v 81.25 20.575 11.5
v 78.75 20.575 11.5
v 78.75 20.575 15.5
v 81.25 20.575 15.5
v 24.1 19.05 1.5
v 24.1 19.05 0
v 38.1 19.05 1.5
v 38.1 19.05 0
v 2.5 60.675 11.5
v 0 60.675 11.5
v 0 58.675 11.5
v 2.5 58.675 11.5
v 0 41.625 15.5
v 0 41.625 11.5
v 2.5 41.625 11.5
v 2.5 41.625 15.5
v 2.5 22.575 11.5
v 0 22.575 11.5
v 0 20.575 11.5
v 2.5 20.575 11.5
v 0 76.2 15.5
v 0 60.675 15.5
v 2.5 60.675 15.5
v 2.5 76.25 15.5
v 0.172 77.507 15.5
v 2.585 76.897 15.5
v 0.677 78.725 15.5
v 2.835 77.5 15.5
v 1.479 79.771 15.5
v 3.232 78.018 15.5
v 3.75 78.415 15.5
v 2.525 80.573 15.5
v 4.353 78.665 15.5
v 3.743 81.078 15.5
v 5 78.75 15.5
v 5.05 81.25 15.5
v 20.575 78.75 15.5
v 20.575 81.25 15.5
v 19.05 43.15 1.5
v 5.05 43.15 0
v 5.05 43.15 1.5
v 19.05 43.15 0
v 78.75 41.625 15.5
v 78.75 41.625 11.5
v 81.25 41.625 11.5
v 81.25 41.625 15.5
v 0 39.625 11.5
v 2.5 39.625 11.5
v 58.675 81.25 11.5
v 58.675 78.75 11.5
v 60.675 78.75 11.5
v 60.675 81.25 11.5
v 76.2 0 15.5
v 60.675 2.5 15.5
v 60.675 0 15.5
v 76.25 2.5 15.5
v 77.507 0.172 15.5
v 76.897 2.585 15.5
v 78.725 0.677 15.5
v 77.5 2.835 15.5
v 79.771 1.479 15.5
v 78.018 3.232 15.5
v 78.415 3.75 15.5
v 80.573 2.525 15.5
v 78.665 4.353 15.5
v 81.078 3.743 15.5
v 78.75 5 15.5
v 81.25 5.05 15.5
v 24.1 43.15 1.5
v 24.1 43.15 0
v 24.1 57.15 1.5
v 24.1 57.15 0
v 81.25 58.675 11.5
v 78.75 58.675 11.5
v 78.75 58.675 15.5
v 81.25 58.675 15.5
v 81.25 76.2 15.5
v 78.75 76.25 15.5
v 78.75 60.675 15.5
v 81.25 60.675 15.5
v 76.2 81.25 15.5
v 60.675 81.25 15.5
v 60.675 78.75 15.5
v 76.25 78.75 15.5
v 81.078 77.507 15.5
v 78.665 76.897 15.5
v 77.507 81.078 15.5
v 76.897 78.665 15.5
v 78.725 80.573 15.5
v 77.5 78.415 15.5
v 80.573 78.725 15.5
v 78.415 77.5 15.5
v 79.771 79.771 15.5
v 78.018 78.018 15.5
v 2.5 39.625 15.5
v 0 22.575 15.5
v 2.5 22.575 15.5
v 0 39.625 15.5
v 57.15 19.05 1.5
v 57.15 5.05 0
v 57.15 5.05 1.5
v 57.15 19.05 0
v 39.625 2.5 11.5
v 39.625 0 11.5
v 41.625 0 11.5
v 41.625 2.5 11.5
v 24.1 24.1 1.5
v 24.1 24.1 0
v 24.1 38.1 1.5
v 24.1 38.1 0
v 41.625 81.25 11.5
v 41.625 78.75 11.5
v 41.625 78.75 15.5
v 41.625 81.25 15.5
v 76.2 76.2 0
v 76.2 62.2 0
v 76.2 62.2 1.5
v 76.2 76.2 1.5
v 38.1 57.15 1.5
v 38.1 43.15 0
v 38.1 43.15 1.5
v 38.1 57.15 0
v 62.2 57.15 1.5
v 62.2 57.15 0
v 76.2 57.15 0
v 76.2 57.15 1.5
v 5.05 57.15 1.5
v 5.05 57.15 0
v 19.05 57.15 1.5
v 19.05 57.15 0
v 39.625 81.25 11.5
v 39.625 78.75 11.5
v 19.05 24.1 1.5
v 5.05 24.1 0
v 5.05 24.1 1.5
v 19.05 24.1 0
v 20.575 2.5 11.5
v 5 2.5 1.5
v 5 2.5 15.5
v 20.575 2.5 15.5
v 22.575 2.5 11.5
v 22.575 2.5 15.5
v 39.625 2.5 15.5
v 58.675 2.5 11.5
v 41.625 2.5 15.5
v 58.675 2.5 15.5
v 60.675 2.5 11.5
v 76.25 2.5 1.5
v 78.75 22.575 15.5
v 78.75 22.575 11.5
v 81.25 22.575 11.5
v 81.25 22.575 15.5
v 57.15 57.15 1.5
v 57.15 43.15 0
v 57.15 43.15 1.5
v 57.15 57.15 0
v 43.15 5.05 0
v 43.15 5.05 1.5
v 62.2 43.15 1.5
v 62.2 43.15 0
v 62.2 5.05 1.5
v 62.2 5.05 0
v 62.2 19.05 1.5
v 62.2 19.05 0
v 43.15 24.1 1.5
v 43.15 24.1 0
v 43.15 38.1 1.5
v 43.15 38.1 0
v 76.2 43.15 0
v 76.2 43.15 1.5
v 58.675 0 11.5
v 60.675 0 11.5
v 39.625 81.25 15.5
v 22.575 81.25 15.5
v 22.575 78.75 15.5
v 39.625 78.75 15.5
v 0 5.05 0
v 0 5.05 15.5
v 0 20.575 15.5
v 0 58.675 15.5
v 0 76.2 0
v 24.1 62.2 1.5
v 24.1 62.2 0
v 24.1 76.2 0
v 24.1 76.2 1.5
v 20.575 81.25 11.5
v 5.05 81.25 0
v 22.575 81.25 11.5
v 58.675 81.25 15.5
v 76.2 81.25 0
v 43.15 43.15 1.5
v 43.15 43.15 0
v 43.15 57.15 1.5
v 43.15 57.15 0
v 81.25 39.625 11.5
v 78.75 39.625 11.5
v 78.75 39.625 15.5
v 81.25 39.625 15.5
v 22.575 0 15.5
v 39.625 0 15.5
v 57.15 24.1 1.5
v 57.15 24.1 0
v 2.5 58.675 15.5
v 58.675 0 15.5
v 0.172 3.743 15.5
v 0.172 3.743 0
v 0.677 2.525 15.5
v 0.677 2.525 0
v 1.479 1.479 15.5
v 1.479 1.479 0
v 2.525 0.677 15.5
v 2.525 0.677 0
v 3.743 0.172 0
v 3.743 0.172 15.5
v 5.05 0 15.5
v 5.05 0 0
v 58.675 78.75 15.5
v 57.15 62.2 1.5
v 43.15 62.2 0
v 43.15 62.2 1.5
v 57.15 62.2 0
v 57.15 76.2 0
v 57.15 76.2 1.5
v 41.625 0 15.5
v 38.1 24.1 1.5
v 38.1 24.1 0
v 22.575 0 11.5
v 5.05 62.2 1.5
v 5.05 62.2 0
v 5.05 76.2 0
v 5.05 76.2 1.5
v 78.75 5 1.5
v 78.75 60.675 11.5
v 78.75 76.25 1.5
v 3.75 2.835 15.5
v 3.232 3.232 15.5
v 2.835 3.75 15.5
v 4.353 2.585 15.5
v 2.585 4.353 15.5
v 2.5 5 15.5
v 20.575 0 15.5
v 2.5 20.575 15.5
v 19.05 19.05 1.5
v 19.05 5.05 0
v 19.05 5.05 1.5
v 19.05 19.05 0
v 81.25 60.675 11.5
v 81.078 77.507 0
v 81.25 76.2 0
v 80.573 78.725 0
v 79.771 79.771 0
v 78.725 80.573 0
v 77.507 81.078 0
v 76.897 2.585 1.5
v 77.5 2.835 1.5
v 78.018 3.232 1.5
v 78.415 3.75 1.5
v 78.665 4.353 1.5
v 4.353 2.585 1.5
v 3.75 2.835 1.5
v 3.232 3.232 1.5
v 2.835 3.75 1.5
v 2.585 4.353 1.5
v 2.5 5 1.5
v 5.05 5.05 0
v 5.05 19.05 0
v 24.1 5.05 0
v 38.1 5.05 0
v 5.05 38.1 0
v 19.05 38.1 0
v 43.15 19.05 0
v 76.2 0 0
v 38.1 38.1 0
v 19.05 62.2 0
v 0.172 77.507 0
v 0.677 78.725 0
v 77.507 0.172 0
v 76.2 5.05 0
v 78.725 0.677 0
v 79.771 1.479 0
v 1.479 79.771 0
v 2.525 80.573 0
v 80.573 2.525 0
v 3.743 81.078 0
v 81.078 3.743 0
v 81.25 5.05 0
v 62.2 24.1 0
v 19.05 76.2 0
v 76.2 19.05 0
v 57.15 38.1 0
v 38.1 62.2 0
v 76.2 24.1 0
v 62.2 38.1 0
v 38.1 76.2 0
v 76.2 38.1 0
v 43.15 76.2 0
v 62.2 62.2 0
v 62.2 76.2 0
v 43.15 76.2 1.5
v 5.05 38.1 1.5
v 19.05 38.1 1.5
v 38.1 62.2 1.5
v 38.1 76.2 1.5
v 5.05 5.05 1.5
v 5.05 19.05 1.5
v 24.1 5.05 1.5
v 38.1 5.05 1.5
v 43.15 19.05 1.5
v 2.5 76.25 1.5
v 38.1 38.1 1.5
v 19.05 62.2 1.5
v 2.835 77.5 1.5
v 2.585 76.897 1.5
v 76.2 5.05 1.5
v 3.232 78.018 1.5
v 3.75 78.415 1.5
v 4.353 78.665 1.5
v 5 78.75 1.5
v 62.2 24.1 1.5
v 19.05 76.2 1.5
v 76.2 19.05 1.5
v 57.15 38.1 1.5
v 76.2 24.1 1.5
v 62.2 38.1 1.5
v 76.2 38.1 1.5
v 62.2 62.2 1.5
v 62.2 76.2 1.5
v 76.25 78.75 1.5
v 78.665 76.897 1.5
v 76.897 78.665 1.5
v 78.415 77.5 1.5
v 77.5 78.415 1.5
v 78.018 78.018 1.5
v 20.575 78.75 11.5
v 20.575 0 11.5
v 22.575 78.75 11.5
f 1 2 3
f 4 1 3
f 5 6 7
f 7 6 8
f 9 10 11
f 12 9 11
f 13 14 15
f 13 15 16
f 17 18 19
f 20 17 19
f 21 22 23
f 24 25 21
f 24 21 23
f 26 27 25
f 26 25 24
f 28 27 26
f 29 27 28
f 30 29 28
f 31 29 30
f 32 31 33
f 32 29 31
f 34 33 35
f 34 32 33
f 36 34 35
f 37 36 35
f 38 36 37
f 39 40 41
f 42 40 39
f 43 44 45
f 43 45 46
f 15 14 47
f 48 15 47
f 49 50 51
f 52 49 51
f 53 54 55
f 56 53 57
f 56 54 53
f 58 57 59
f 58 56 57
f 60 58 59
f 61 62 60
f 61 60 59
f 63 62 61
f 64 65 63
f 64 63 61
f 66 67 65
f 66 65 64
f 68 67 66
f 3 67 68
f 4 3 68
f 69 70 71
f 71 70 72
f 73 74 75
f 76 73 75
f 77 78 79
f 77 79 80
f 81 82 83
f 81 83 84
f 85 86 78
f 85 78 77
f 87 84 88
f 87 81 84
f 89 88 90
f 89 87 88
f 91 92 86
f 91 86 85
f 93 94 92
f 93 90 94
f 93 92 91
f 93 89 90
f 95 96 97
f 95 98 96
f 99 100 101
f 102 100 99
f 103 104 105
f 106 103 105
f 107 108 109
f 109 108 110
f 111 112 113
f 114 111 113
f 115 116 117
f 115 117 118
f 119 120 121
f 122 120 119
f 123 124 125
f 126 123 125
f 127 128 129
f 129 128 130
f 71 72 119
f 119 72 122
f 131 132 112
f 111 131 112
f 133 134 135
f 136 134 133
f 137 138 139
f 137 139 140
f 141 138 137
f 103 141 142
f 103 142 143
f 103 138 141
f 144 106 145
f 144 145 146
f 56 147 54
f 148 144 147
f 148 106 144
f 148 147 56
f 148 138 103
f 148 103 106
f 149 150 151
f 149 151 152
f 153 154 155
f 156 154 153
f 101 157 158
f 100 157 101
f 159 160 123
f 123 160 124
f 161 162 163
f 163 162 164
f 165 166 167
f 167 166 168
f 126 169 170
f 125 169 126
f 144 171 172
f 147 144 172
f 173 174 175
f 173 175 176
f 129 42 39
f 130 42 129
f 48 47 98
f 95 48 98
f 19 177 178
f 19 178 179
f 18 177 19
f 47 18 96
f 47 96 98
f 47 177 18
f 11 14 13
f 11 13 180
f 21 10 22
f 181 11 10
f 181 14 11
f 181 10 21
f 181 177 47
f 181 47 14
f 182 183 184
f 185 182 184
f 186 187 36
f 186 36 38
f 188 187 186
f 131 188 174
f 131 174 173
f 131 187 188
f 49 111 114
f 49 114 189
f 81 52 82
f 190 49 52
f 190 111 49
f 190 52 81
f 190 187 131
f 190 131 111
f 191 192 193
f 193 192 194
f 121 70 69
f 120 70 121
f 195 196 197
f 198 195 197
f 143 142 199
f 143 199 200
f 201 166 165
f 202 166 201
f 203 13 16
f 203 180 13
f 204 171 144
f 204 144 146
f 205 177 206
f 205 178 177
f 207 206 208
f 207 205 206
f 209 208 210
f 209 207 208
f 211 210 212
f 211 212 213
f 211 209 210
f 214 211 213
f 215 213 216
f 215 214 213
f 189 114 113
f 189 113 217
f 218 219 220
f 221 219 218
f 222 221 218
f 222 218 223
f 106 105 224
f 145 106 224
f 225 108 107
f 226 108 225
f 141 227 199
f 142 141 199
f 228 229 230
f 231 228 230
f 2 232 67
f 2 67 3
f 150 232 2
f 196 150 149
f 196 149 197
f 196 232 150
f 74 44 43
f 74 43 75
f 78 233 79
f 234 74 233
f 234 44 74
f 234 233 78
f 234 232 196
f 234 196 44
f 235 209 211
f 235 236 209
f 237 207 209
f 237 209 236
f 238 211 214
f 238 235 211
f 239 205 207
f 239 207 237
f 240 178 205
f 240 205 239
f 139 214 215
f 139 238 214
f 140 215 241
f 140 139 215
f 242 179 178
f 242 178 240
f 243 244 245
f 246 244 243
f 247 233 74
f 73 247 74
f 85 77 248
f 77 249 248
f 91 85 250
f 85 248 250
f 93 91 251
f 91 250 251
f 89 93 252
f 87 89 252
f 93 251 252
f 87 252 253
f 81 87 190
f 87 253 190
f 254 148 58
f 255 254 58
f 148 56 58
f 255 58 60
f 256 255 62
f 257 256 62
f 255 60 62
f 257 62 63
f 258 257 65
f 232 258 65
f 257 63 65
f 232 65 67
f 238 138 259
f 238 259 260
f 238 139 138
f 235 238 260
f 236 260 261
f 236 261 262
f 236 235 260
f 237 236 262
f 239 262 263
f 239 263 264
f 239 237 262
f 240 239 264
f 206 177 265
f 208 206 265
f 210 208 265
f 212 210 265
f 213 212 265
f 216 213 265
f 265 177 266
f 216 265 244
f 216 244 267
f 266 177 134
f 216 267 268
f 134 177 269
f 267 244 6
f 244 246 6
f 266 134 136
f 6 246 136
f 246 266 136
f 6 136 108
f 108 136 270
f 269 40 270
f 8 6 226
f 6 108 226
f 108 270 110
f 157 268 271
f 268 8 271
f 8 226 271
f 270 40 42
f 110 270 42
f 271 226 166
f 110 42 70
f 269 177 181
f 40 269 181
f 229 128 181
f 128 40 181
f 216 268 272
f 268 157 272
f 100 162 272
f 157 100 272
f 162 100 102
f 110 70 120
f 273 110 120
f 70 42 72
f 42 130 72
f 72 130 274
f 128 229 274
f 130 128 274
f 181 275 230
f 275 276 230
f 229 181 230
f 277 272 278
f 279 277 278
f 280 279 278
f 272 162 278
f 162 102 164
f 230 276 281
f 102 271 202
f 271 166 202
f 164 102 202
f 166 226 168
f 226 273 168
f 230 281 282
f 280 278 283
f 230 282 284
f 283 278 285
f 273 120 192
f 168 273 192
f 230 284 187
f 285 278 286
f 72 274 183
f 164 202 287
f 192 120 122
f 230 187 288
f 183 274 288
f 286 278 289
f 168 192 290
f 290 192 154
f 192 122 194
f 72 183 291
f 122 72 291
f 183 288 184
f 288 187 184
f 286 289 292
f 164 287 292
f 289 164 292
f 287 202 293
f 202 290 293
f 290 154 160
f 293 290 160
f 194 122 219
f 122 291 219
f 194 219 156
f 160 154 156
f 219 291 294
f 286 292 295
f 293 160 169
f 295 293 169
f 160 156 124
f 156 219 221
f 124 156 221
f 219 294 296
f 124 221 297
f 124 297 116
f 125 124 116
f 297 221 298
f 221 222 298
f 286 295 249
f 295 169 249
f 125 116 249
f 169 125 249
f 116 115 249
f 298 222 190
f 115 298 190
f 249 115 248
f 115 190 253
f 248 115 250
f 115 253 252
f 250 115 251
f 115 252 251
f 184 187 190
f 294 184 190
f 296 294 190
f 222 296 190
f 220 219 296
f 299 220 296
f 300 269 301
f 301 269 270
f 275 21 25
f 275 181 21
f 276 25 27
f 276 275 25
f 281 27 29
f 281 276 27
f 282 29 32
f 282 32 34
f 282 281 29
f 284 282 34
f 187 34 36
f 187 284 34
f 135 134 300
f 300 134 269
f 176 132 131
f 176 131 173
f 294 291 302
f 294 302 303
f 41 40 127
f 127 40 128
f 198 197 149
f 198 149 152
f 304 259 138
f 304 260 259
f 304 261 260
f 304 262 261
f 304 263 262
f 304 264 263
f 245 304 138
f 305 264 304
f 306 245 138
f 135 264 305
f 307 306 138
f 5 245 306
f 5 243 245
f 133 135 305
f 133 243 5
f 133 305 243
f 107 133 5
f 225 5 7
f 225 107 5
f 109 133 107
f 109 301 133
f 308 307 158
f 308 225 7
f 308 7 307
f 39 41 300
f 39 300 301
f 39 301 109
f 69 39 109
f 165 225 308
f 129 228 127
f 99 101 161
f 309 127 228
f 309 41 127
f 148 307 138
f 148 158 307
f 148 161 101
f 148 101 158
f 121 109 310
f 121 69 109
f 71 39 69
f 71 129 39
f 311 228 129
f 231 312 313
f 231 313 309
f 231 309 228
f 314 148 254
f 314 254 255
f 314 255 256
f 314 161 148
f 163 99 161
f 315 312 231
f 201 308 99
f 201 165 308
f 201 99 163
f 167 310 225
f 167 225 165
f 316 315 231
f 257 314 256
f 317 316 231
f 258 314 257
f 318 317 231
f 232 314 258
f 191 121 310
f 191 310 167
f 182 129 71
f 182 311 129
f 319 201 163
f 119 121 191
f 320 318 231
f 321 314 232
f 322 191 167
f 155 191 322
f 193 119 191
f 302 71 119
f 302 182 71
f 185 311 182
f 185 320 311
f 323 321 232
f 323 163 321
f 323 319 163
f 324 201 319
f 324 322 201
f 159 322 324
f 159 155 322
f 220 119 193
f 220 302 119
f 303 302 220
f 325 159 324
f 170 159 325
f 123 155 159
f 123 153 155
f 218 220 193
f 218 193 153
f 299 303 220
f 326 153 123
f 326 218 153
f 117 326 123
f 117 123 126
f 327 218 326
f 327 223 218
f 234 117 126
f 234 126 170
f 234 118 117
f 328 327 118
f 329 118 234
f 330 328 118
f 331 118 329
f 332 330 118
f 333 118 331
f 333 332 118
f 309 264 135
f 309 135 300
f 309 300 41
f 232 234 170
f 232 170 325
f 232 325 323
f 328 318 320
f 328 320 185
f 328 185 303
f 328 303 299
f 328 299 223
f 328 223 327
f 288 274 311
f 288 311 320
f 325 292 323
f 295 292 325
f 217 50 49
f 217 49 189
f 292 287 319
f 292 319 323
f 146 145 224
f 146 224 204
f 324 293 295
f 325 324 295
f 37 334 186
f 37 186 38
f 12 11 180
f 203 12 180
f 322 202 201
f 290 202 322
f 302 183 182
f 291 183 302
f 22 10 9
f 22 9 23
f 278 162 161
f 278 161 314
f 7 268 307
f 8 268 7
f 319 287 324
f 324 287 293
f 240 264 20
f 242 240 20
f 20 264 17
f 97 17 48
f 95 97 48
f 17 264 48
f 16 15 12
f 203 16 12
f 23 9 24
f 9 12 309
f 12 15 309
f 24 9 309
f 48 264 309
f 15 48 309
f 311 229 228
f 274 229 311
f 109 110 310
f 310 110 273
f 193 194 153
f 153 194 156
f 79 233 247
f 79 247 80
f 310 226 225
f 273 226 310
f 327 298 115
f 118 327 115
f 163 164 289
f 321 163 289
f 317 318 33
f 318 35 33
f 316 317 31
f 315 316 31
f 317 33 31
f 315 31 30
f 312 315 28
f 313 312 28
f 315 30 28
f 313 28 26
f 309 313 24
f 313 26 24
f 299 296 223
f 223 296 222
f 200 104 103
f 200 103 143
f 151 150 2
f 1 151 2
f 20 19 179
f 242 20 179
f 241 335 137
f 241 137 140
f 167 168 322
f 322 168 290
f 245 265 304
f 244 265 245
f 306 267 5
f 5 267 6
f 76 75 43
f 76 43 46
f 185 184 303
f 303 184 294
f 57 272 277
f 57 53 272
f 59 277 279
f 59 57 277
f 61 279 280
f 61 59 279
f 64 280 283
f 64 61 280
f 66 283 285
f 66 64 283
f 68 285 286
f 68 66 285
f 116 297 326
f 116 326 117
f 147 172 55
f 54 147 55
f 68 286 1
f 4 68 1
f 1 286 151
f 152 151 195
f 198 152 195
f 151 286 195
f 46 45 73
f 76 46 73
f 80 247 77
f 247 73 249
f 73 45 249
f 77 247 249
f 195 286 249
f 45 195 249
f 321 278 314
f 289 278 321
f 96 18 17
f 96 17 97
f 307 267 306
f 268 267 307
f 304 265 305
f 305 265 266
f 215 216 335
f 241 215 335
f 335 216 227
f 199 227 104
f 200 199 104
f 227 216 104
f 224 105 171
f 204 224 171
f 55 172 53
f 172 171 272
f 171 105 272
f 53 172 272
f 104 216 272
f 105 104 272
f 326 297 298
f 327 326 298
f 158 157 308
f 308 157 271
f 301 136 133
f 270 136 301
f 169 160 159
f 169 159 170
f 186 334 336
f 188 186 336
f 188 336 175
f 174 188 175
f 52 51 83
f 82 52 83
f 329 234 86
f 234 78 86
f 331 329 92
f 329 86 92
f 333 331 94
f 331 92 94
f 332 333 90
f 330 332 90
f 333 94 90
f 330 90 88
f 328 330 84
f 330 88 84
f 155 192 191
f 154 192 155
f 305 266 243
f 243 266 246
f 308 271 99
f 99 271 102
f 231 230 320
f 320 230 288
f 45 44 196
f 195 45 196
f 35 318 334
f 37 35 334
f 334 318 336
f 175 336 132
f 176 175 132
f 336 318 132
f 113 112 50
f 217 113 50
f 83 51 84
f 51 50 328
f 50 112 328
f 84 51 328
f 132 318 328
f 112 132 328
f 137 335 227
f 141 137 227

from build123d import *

# Parameters (mm, degrees)
SKETCH_W        = 81.25
SKETCH_H        = 81.25
SKETCH_W_2      = 14
SKETCH_H_2      = 14
PAD_DEPTH       = 1.5
SKETCH001_W     = 81.25
SKETCH001_H     = 81.25
SKETCH001_W_2   = 76.25
SKETCH001_H_2   = 76.25
PAD001_DEPTH    = 14
FILLET_R        = 5.05
FILLET001_R     = 2.5
SKETCH002_W     = 2
SKETCH002_H     = 4
POCKET_DEPTH    = 85
SKETCH003_W     = 2
SKETCH003_H     = 4
POCKET001_DEPTH = 86


with BuildPart() as part:
    # Sketch → Pad (new body)
    with BuildSketch(Plane.XY):
        with Locations((40.625, 40.625)):
            Rectangle(SKETCH_W, SKETCH_H)
        with Locations((12.05, 69.2)):
            Rectangle(SKETCH_W_2, SKETCH_H_2, mode=Mode.SUBTRACT)
        with Locations((31.1, 69.2)):
            Rectangle(SKETCH_W_2, SKETCH_H_2, mode=Mode.SUBTRACT)
        with Locations((50.15, 69.2)):
            Rectangle(SKETCH_W_2, SKETCH_H_2, mode=Mode.SUBTRACT)
        with Locations((69.2, 69.2)):
            Rectangle(SKETCH_W_2, SKETCH_H_2, mode=Mode.SUBTRACT)
        with Locations((12.05, 50.15)):
            Rectangle(SKETCH_W_2, SKETCH_H_2, mode=Mode.SUBTRACT)
        with Locations((31.1, 50.15)):
            Rectangle(SKETCH_W_2, SKETCH_H_2, mode=Mode.SUBTRACT)
        with Locations((50.15, 50.15)):
            Rectangle(SKETCH_W_2, SKETCH_H_2, mode=Mode.SUBTRACT)
        with Locations((69.2, 50.15)):
            Rectangle(SKETCH_W_2, SKETCH_H_2, mode=Mode.SUBTRACT)
        with Locations((12.05, 31.1)):
            Rectangle(SKETCH_W_2, SKETCH_H_2, mode=Mode.SUBTRACT)
        with Locations((31.1, 31.1)):
            Rectangle(SKETCH_W_2, SKETCH_H_2, mode=Mode.SUBTRACT)
        with Locations((50.15, 31.1)):
            Rectangle(SKETCH_W_2, SKETCH_H_2, mode=Mode.SUBTRACT)
        with Locations((69.2, 31.1)):
            Rectangle(SKETCH_W_2, SKETCH_H_2, mode=Mode.SUBTRACT)
        with Locations((12.05, 12.05)):
            Rectangle(SKETCH_W_2, SKETCH_H_2, mode=Mode.SUBTRACT)
        with Locations((31.1, 12.05)):
            Rectangle(SKETCH_W_2, SKETCH_H_2, mode=Mode.SUBTRACT)
        with Locations((50.15, 12.05)):
            Rectangle(SKETCH_W_2, SKETCH_H_2, mode=Mode.SUBTRACT)
        with Locations((69.2, 12.05)):
            Rectangle(SKETCH_W_2, SKETCH_H_2, mode=Mode.SUBTRACT)
    extrude(amount=PAD_DEPTH)

    # Sketch001 (on Face70 of Pad) → Pad001 (join)
    with BuildSketch(Plane.XY.offset(1.5)):
        with Locations((40.625, 40.625)):
            Rectangle(SKETCH001_W, SKETCH001_H)
        with Locations((40.625, 40.625)):
            Rectangle(SKETCH001_W_2, SKETCH001_H_2, mode=Mode.SUBTRACT)
    extrude(amount=PAD001_DEPTH)

    # Fillet
    fillet_edges = [part.edges().sort_by_distance(p)[0] for p in [
        (0, 0, 8.5),
        (81.25, 0, 8.5),
        (81.25, 81.25, 8.5),
        (0, 81.25, 8.5),
    ]]
    fillet(fillet_edges, radius=FILLET_R)

    # Fillet001
    fillet001_edges = [part.edges().sort_by_distance(p)[0] for p in [
        (2.5, 78.75, 8.5),
        (2.5, 2.5, 8.5),
        (78.75, 2.5, 8.5),
        (78.75, 78.75, 8.5),
    ]]
    fillet(fillet001_edges, radius=FILLET001_R)

    # Sketch002 (on Face10 of Fillet001) → Pocket (cut)
    with BuildSketch(Plane.XZ):
        with Locations((40.625, 13.5)):
            Rectangle(SKETCH002_W, SKETCH002_H)
        with Locations((21.575, 13.5)):
            Rectangle(SKETCH002_W, SKETCH002_H)
        with Locations((59.675, 13.5)):
            Rectangle(SKETCH002_W, SKETCH002_H)
    extrude(amount=-POCKET_DEPTH, mode=Mode.SUBTRACT)

    # Sketch003 (on Face9 of Pocket) → Pocket001 (cut)
    with BuildSketch(Plane(origin=(0, 0, 0), x_dir=(0, -1, 0), z_dir=(-1, 0, 0))):
        with Locations((-40.625, 13.5)):
            Rectangle(SKETCH003_W, SKETCH003_H)
        with Locations((-21.575, 13.5)):
            Rectangle(SKETCH003_W, SKETCH003_H)
        with Locations((-59.675, 13.5)):
            Rectangle(SKETCH003_W, SKETCH003_H)
    extrude(amount=-POCKET001_DEPTH, mode=Mode.SUBTRACT)


solid = part.part
